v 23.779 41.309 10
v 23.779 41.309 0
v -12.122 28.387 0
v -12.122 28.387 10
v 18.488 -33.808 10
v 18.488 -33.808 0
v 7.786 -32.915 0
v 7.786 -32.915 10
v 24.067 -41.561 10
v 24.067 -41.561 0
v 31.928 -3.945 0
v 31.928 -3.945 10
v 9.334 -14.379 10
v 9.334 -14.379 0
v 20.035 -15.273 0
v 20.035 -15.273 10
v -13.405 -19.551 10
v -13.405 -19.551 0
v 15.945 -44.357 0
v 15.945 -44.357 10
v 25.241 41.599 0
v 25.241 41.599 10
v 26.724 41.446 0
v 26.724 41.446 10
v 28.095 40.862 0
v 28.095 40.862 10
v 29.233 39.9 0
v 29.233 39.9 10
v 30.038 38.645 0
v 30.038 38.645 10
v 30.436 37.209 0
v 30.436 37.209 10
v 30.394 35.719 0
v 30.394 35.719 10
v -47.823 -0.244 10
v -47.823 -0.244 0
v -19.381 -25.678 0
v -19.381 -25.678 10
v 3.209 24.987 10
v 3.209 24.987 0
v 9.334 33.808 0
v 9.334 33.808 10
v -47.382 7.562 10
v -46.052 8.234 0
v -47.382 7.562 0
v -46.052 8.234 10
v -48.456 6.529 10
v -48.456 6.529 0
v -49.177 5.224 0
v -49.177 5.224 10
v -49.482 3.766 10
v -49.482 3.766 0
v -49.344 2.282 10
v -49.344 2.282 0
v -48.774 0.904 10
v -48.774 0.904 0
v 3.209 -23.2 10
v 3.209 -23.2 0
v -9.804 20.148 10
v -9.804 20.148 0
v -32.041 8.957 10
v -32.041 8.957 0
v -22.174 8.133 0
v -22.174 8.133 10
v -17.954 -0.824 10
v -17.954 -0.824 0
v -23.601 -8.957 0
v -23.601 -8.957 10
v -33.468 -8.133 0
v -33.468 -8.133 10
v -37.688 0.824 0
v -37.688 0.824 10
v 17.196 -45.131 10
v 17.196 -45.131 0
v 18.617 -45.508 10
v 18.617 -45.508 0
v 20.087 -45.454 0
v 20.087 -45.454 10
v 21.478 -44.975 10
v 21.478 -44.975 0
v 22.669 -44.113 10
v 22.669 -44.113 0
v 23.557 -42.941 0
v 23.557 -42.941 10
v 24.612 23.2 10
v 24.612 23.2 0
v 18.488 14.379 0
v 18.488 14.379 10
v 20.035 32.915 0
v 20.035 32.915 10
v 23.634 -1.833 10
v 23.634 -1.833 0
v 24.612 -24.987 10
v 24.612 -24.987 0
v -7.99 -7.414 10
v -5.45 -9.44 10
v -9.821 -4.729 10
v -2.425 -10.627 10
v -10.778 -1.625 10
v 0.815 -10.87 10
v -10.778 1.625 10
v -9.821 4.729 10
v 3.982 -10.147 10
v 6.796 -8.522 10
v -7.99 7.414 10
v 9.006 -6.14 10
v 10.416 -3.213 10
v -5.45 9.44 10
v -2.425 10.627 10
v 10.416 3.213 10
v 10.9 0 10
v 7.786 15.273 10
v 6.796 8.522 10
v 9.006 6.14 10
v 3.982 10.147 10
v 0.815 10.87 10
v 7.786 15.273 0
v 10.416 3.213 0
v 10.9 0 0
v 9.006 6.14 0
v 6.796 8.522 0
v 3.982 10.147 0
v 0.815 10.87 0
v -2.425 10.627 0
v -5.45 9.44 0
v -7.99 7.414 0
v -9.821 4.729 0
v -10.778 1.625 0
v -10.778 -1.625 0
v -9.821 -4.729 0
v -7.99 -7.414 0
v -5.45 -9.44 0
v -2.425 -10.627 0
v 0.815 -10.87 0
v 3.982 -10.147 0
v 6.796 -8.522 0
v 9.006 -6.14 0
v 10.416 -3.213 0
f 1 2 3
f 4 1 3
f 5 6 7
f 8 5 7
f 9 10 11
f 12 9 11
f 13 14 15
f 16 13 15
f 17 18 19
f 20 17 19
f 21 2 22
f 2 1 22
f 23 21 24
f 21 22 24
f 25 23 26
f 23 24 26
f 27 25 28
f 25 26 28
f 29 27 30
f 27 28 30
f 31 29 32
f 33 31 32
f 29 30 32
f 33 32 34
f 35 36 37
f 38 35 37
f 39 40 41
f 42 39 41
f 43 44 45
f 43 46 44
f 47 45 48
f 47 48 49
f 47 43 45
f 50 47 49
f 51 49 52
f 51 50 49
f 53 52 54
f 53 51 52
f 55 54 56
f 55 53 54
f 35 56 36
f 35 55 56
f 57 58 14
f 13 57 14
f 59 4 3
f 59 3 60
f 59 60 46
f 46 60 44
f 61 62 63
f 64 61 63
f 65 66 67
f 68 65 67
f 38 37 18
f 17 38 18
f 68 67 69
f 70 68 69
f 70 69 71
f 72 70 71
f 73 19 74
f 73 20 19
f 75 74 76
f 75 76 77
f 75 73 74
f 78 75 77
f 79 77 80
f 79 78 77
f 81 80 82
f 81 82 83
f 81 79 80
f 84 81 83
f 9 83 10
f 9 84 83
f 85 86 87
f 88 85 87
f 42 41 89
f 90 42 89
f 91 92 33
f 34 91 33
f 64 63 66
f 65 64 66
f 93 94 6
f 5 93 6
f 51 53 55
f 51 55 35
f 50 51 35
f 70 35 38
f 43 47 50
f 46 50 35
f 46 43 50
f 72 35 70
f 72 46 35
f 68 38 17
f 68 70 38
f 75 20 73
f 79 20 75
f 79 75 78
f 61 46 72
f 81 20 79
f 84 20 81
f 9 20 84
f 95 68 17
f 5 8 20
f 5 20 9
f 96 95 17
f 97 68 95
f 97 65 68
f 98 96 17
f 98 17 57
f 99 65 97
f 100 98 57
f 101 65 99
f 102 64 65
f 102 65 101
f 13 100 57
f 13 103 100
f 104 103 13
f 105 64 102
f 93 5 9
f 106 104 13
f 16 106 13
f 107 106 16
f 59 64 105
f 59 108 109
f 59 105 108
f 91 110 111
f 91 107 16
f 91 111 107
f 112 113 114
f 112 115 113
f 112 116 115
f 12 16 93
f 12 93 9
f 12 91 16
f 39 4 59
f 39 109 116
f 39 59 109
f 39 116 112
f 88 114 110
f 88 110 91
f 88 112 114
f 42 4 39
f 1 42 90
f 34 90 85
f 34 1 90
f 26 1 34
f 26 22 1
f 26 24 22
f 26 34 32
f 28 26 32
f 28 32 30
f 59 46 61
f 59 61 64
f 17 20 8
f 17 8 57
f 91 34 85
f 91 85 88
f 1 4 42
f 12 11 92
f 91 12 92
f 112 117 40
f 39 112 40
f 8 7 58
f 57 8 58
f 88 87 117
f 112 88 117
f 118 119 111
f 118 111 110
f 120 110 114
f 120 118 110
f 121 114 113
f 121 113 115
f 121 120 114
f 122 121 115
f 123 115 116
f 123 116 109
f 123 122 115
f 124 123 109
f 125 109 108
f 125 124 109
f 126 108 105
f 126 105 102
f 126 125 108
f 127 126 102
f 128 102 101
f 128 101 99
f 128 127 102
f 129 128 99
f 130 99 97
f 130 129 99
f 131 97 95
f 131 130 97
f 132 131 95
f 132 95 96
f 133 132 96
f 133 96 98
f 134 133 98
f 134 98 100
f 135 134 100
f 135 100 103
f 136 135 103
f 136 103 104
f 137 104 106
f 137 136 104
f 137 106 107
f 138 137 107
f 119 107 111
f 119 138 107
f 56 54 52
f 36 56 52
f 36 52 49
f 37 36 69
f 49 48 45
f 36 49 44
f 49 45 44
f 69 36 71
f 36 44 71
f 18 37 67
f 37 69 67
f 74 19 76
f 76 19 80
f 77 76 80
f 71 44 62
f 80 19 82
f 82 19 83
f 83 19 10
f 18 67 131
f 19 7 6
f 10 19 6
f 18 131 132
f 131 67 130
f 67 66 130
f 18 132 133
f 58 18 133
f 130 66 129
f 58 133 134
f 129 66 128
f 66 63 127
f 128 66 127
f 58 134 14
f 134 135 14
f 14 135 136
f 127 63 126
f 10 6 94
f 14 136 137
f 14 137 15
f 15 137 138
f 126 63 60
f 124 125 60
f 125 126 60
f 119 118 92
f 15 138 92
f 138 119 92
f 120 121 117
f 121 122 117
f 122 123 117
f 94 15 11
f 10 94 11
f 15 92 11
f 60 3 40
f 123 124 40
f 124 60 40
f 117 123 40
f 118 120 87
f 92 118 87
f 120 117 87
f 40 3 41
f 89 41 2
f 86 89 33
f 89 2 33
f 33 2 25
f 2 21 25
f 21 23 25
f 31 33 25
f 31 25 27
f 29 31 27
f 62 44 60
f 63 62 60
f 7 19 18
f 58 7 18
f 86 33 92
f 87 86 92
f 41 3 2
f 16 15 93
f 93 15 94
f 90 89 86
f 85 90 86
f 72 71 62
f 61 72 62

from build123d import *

# Parameters (mm, degrees)
F0_R     = 10.9
F1_DEPTH = 10
F2_R     = 5


with BuildPart() as f1:
    # F0 (on Top) → F1 (new body)
    with BuildSketch(Plane.XY):
        Polygon((-9.80383, 20.148403), (-54.278841, 5.529257), (-19.380784, -25.677659), (-13.404791, -19.551069), (22.350943, -49.771483), (31.927897, -3.945421), (23.634117, -1.833355), (31.927897, 44.242227), (-12.121617, 28.38706), align=None)
        Polygon((24.612059, -24.987273), (18.487568, -33.808305), (7.786085, -32.914856), (3.209092, -23.200375), (9.333583, -14.379343), (20.035067, -15.272792), align=None, mode=Mode.SUBTRACT)
        Polygon((-33.468196, -8.133371), (-37.68838, 0.823798), (-32.041335, 8.957169), (-22.174107, 8.133371), (-17.953923, -0.823798), (-23.600968, -8.957169), align=None, mode=Mode.SUBTRACT)
        Circle(F0_R, mode=Mode.SUBTRACT)
        Polygon((9.333583, 33.808305), (20.035067, 32.914856), (24.612059, 23.200375), (18.487568, 14.379343), (7.786085, 15.272792), (3.209092, 24.987273), align=None, mode=Mode.SUBTRACT)
    extrude(amount=F1_DEPTH)

    # F2
    f2_edges = [f1.edges().sort_by_distance(p)[0] for p in [
        (22.350943, -49.771483, 5),
        (31.927897, 44.242227, 5),
        (-54.278841, 5.529257, 5),
    ]]
    fillet(f2_edges, radius=F2_R)


solid = f1.part
